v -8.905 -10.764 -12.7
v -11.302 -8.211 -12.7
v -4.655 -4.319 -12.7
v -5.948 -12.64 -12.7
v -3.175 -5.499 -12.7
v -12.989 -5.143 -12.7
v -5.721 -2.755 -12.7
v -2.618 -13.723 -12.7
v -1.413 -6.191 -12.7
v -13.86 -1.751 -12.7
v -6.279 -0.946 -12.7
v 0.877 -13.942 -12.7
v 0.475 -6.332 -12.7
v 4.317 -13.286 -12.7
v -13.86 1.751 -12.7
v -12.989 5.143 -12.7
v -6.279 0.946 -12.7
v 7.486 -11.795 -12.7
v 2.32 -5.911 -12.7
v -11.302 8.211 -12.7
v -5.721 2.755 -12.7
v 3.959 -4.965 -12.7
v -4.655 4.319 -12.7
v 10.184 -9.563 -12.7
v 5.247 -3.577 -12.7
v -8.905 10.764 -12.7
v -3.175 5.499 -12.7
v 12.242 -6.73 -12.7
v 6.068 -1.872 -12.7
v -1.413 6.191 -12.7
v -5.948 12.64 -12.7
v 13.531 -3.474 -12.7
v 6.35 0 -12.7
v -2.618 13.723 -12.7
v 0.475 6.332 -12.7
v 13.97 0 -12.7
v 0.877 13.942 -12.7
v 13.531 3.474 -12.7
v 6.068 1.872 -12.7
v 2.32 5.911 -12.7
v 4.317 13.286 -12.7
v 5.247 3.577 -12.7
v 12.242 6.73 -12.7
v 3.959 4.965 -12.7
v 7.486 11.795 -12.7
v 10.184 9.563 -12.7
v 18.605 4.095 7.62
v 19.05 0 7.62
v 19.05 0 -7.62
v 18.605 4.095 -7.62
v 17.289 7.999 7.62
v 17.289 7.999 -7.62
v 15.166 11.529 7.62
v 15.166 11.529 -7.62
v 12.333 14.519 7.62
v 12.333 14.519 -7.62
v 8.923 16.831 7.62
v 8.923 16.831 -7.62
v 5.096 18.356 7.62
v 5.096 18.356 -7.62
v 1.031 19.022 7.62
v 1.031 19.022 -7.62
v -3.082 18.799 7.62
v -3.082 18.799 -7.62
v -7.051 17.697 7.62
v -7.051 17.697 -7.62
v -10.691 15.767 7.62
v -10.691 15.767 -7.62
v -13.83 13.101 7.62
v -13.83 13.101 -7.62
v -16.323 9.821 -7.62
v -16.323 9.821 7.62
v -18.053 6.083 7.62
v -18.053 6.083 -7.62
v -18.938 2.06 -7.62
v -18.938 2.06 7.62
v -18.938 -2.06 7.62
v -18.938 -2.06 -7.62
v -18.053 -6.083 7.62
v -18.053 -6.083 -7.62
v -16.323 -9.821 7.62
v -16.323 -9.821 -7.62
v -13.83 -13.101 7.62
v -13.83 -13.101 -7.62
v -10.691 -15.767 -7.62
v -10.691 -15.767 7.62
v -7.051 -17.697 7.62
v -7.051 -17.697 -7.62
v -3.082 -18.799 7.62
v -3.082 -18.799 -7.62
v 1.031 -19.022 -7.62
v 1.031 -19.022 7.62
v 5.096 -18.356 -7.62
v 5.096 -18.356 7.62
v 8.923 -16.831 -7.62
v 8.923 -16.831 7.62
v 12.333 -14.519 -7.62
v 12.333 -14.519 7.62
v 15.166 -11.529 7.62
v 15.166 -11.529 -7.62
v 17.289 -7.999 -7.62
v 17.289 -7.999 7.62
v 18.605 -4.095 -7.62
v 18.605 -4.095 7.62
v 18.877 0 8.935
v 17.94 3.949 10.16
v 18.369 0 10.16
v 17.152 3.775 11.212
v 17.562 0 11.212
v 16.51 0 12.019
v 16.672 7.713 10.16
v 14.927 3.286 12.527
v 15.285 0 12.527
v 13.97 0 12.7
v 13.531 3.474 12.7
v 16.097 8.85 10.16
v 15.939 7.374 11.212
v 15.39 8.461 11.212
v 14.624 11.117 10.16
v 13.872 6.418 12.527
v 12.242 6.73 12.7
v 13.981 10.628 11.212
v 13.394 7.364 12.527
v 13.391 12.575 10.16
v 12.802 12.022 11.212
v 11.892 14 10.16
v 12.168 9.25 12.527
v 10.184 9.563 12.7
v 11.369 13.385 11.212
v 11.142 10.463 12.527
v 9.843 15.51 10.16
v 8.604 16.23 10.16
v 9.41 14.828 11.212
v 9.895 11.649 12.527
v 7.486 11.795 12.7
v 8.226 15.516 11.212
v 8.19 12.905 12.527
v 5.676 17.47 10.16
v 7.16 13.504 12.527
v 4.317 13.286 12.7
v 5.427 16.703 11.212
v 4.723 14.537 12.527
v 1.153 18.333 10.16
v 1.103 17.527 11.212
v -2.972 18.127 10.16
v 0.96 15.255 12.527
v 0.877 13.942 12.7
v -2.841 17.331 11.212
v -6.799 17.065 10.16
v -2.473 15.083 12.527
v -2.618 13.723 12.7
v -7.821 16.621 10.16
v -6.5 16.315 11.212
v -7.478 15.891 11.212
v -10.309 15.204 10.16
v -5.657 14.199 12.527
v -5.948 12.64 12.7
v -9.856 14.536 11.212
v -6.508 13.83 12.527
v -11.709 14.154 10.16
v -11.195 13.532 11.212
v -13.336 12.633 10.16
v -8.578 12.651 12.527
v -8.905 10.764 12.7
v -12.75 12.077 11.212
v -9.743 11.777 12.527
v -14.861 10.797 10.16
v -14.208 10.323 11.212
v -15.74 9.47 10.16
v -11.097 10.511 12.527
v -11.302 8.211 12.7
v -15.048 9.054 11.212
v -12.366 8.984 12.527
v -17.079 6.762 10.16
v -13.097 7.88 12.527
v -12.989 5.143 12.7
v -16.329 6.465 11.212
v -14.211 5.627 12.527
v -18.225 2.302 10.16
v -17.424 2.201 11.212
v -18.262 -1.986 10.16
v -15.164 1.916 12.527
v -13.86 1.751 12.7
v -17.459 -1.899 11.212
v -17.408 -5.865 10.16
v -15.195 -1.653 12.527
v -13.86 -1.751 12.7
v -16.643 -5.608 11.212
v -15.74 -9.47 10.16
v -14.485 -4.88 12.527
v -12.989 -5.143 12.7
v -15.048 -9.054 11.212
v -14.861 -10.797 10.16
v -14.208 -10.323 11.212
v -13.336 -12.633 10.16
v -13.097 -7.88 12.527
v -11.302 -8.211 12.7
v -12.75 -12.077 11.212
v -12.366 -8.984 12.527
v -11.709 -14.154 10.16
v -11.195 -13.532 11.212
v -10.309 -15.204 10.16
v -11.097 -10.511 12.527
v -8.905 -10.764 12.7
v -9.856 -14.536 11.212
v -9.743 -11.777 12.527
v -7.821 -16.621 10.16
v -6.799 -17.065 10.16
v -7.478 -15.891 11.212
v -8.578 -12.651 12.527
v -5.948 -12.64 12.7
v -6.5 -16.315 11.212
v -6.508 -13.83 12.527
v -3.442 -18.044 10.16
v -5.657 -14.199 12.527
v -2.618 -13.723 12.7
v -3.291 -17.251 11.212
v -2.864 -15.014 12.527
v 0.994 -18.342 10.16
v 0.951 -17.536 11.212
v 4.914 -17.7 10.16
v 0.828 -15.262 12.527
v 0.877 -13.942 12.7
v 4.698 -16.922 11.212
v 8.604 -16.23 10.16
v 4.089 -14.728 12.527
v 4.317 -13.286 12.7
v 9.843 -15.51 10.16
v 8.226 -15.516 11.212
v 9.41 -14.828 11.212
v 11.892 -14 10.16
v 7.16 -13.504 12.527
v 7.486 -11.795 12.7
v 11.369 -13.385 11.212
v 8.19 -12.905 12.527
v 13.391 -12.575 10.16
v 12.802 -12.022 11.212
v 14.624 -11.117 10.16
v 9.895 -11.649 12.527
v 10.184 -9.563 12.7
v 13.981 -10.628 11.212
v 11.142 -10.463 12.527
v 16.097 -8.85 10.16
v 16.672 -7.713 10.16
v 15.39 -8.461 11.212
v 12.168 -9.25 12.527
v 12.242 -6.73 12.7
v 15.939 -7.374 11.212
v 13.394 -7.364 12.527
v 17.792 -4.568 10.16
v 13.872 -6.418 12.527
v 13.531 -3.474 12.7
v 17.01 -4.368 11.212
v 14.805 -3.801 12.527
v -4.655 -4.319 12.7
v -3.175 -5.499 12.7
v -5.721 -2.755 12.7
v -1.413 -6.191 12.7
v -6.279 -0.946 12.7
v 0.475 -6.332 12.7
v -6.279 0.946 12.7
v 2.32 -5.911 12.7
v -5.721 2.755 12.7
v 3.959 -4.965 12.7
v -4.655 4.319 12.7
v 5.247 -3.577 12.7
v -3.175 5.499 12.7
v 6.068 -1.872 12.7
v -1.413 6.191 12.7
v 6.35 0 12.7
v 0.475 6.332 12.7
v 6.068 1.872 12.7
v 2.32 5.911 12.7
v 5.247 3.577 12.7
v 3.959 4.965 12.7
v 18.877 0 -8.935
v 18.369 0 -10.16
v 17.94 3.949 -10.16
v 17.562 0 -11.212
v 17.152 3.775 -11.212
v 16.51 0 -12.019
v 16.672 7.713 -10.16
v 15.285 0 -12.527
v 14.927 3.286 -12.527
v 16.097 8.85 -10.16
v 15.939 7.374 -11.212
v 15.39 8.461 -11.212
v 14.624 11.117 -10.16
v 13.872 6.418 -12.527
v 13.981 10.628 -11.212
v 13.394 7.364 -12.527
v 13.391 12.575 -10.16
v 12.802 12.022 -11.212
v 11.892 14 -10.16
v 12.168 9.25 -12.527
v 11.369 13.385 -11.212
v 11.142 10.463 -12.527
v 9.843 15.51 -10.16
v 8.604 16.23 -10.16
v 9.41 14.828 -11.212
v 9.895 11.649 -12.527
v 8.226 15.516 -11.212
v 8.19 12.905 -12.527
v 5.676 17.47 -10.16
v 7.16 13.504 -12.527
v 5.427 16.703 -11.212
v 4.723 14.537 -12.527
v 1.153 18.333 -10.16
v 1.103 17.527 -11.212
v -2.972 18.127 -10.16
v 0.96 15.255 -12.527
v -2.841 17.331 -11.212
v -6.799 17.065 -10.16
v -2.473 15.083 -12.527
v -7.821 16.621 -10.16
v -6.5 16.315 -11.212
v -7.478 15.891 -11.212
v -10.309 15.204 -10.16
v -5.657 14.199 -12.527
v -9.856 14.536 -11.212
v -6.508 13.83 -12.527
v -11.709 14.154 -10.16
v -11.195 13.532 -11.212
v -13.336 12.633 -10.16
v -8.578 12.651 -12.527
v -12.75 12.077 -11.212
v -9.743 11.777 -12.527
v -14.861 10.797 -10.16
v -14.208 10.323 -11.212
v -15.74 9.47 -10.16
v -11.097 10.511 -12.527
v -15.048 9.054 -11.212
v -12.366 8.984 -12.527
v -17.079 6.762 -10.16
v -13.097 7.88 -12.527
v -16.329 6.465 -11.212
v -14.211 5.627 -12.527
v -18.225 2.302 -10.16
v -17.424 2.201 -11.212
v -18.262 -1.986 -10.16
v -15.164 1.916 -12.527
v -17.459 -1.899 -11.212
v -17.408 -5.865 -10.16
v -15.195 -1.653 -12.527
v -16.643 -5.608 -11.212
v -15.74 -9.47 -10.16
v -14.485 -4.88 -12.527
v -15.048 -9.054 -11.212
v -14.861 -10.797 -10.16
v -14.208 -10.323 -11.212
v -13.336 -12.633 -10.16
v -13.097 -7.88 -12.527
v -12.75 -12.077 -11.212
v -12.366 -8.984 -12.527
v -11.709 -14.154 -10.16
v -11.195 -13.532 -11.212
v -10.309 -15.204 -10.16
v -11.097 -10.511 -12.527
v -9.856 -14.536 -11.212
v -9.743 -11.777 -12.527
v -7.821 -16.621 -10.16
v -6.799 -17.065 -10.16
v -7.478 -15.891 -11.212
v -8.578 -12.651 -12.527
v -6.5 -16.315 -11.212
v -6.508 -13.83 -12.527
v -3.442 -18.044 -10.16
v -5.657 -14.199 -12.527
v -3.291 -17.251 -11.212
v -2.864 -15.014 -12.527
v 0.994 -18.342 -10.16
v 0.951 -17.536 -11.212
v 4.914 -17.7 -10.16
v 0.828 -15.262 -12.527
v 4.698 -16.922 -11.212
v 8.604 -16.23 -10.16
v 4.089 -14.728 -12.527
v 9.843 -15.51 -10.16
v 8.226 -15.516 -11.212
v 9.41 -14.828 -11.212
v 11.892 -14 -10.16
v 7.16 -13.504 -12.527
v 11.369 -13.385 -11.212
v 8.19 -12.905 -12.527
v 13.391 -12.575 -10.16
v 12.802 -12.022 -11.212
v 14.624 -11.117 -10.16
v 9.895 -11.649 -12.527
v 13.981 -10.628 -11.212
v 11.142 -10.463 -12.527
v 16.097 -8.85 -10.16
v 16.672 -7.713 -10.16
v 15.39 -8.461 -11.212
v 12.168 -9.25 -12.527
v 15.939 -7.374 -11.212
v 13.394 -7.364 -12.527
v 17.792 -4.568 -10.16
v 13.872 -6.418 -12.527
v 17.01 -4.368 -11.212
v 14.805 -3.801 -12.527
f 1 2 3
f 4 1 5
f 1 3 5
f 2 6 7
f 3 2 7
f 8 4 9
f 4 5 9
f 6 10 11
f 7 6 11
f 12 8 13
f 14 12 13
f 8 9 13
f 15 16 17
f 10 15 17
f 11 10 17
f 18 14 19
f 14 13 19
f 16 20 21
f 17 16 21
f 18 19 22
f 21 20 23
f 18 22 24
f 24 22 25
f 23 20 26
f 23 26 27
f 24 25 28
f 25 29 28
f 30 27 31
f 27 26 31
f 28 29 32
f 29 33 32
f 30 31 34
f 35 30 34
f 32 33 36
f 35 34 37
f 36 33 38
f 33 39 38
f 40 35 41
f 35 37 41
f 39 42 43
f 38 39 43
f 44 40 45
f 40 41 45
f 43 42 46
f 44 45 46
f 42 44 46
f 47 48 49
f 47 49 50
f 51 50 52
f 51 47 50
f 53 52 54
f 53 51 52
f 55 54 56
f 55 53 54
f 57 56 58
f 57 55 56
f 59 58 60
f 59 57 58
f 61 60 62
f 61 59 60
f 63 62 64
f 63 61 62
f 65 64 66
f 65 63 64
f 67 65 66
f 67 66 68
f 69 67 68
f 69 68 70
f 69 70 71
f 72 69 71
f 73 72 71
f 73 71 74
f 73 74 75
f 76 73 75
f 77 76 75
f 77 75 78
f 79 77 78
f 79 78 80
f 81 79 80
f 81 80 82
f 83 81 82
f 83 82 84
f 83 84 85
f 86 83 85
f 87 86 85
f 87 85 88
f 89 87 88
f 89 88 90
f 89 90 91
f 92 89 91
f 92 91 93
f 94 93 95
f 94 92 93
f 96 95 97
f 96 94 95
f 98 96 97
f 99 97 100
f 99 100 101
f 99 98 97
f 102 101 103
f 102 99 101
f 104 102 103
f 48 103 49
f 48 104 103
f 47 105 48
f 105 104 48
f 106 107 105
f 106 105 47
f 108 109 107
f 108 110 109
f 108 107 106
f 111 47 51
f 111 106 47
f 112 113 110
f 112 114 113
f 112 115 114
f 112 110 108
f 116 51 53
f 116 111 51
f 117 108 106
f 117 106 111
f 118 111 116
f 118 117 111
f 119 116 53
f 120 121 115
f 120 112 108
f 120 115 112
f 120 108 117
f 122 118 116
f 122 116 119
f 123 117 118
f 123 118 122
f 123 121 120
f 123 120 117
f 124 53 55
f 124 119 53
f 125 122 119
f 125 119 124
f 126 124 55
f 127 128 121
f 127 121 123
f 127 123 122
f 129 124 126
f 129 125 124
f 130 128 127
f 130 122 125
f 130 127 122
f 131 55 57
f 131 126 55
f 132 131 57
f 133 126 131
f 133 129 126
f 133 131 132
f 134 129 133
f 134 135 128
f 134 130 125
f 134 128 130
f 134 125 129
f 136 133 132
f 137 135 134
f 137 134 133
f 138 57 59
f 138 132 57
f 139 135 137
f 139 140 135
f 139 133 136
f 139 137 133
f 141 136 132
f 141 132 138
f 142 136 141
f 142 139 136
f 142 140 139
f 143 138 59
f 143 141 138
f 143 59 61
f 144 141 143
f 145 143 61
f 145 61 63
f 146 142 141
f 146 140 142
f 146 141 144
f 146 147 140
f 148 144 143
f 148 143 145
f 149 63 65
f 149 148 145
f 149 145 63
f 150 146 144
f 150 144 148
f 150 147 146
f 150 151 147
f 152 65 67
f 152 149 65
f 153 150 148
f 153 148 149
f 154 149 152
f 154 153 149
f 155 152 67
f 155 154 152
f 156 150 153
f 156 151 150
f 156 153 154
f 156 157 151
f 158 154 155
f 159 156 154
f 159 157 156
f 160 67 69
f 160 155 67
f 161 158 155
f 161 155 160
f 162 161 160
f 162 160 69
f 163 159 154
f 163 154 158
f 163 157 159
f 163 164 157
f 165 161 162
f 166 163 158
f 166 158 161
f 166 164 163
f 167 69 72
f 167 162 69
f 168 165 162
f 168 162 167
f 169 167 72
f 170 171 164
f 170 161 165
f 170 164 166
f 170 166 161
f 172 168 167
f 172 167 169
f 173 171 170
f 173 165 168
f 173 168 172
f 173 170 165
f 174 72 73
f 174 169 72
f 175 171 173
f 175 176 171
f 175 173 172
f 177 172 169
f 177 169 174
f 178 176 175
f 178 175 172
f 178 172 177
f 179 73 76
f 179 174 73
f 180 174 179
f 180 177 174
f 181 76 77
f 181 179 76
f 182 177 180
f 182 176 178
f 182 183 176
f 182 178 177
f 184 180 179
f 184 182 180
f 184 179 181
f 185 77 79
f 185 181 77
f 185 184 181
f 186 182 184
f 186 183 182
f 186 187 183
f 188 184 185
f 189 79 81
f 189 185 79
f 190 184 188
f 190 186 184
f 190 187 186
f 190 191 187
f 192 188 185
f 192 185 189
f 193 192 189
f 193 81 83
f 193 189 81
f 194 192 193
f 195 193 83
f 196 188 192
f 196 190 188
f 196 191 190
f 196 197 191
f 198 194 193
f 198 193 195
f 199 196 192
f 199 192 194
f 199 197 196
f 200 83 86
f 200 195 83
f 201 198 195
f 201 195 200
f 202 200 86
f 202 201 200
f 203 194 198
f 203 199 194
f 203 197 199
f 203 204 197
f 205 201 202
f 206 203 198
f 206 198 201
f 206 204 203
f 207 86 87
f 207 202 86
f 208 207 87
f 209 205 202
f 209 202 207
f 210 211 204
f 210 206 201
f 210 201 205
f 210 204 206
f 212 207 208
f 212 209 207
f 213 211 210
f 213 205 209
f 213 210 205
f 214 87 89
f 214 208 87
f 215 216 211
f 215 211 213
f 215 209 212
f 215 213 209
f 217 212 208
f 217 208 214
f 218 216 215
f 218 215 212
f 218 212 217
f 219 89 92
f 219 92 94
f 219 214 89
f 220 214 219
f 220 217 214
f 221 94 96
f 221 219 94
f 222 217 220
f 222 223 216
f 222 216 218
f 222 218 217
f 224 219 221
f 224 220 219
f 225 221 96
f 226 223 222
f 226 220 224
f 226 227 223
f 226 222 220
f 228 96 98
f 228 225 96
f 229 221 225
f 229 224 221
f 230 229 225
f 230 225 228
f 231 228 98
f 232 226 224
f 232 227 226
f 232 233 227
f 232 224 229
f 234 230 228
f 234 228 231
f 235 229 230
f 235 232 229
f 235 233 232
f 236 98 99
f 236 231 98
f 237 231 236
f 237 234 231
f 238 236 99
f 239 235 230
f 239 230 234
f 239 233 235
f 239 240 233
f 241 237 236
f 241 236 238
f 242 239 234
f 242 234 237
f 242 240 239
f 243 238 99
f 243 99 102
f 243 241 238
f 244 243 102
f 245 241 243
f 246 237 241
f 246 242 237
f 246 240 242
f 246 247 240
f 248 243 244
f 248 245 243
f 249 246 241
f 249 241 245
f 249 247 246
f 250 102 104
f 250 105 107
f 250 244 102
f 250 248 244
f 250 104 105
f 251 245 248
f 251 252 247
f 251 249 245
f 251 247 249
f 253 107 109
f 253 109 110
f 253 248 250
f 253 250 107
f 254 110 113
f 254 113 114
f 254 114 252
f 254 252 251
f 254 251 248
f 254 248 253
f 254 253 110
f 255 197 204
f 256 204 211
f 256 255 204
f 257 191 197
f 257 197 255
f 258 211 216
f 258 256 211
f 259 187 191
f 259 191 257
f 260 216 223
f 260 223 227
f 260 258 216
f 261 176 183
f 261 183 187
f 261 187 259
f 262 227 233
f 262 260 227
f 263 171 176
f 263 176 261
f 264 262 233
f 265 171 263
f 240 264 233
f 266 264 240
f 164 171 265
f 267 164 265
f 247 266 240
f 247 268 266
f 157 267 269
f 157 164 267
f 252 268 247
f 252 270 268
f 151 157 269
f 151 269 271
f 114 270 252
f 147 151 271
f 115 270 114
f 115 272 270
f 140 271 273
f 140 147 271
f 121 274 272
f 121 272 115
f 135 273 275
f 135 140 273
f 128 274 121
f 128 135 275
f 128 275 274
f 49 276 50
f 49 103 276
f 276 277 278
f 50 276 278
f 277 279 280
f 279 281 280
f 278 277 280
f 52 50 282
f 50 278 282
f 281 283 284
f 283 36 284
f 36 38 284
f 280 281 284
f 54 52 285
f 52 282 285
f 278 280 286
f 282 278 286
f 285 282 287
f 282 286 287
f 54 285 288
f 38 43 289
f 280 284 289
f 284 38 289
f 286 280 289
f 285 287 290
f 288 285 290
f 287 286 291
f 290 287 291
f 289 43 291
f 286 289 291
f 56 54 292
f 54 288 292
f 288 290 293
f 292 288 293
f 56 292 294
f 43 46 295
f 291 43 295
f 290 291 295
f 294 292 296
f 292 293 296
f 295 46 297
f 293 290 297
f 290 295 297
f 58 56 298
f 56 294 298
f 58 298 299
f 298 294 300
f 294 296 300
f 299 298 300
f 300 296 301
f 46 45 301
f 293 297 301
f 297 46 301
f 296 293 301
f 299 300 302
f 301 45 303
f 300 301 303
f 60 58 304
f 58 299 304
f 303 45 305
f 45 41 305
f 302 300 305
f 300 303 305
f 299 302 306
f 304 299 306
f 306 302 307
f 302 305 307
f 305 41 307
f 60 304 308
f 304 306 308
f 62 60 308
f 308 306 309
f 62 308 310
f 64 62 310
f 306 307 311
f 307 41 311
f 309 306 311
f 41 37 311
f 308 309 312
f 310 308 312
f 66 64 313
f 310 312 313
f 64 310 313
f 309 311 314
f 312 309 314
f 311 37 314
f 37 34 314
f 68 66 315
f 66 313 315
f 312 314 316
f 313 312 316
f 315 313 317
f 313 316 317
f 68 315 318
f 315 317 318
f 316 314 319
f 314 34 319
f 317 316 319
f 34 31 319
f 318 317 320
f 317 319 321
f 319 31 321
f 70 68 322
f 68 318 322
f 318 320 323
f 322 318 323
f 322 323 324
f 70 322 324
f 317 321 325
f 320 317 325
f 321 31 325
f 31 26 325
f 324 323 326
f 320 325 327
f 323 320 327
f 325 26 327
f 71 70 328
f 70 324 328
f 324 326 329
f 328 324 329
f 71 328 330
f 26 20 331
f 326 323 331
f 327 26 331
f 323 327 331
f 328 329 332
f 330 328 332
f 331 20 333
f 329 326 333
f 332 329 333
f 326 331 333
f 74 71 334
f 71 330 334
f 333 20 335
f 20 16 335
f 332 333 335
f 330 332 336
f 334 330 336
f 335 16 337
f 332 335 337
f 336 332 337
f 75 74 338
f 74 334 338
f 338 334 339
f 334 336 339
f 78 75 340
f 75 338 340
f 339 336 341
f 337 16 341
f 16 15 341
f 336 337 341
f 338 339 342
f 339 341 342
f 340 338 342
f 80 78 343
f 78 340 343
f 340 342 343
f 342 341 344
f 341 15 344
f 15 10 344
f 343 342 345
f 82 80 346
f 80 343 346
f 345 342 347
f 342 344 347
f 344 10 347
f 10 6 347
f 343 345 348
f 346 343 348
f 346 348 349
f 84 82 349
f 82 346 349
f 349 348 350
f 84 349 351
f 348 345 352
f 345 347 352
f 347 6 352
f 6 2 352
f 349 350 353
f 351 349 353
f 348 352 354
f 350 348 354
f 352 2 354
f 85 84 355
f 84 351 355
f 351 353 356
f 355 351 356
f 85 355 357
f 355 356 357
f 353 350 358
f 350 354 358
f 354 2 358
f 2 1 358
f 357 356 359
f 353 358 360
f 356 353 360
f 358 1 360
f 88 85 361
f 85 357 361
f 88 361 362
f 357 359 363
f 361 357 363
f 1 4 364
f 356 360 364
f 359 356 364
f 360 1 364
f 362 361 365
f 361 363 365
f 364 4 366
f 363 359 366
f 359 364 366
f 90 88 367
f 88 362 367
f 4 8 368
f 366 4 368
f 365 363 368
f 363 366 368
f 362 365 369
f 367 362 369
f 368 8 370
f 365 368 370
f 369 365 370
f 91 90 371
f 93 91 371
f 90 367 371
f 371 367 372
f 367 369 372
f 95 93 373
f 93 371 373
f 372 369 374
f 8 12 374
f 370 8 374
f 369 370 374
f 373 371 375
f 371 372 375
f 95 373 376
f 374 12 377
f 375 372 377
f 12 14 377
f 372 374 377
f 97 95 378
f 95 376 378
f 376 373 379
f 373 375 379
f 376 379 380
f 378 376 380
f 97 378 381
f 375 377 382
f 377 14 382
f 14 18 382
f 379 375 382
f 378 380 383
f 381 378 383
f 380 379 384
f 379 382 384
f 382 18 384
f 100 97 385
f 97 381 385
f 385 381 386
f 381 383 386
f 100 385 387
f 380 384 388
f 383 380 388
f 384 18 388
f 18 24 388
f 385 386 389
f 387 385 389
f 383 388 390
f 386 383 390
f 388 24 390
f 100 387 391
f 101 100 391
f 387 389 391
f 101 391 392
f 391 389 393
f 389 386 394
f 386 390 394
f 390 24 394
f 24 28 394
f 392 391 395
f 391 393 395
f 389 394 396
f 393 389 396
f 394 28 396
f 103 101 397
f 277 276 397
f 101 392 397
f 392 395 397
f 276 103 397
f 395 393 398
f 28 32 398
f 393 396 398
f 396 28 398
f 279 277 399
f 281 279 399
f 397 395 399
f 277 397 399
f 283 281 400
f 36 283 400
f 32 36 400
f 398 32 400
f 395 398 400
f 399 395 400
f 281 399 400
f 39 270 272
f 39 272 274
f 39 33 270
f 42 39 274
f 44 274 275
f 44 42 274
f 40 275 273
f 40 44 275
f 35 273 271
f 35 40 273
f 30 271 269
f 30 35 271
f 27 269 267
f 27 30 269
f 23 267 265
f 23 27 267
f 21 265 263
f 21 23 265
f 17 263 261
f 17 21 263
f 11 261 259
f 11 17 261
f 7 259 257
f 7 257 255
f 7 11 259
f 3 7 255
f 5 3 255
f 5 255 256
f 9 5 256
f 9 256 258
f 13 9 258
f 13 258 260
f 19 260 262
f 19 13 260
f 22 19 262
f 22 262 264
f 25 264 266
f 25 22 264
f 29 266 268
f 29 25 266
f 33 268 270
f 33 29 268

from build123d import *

# Parameters (mm, degrees)
F0_R     = 19.05
F0_R_2   = 6.35
F1_DEPTH = 12.7
F2_R     = 5.08
F3_DEPTH = 12.7
F4_R     = 5.08


with BuildPart() as f1:
    # F0 (on Top) → F1 (new body, symmetric)
    with BuildSketch(Plane.XY):
        Circle(F0_R)
        Circle(F0_R_2, mode=Mode.SUBTRACT)
    extrude(amount=F1_DEPTH, both=True)

    # F2
    f2_edges = [f1.edges().sort_by_distance(p)[0] for p in [
        (-19.05, 0, -12.7),
        (-19.05, 0, 12.7),
    ]]
    fillet(f2_edges, radius=F2_R)

    # F0 (on Top) → F3 (join, symmetric)
    with BuildSketch(Plane.XY):
        Circle(F0_R)
        Circle(F0_R_2, mode=Mode.SUBTRACT)
    extrude(amount=F3_DEPTH, both=True)

    # F4
    f4_edges = [f1.edges().sort_by_distance(p)[0] for p in [
        (-19.05, 0, -12.7),
        (-19.05, 0, 12.7),
    ]]
    fillet(f4_edges, radius=F4_R)


solid = f1.part
